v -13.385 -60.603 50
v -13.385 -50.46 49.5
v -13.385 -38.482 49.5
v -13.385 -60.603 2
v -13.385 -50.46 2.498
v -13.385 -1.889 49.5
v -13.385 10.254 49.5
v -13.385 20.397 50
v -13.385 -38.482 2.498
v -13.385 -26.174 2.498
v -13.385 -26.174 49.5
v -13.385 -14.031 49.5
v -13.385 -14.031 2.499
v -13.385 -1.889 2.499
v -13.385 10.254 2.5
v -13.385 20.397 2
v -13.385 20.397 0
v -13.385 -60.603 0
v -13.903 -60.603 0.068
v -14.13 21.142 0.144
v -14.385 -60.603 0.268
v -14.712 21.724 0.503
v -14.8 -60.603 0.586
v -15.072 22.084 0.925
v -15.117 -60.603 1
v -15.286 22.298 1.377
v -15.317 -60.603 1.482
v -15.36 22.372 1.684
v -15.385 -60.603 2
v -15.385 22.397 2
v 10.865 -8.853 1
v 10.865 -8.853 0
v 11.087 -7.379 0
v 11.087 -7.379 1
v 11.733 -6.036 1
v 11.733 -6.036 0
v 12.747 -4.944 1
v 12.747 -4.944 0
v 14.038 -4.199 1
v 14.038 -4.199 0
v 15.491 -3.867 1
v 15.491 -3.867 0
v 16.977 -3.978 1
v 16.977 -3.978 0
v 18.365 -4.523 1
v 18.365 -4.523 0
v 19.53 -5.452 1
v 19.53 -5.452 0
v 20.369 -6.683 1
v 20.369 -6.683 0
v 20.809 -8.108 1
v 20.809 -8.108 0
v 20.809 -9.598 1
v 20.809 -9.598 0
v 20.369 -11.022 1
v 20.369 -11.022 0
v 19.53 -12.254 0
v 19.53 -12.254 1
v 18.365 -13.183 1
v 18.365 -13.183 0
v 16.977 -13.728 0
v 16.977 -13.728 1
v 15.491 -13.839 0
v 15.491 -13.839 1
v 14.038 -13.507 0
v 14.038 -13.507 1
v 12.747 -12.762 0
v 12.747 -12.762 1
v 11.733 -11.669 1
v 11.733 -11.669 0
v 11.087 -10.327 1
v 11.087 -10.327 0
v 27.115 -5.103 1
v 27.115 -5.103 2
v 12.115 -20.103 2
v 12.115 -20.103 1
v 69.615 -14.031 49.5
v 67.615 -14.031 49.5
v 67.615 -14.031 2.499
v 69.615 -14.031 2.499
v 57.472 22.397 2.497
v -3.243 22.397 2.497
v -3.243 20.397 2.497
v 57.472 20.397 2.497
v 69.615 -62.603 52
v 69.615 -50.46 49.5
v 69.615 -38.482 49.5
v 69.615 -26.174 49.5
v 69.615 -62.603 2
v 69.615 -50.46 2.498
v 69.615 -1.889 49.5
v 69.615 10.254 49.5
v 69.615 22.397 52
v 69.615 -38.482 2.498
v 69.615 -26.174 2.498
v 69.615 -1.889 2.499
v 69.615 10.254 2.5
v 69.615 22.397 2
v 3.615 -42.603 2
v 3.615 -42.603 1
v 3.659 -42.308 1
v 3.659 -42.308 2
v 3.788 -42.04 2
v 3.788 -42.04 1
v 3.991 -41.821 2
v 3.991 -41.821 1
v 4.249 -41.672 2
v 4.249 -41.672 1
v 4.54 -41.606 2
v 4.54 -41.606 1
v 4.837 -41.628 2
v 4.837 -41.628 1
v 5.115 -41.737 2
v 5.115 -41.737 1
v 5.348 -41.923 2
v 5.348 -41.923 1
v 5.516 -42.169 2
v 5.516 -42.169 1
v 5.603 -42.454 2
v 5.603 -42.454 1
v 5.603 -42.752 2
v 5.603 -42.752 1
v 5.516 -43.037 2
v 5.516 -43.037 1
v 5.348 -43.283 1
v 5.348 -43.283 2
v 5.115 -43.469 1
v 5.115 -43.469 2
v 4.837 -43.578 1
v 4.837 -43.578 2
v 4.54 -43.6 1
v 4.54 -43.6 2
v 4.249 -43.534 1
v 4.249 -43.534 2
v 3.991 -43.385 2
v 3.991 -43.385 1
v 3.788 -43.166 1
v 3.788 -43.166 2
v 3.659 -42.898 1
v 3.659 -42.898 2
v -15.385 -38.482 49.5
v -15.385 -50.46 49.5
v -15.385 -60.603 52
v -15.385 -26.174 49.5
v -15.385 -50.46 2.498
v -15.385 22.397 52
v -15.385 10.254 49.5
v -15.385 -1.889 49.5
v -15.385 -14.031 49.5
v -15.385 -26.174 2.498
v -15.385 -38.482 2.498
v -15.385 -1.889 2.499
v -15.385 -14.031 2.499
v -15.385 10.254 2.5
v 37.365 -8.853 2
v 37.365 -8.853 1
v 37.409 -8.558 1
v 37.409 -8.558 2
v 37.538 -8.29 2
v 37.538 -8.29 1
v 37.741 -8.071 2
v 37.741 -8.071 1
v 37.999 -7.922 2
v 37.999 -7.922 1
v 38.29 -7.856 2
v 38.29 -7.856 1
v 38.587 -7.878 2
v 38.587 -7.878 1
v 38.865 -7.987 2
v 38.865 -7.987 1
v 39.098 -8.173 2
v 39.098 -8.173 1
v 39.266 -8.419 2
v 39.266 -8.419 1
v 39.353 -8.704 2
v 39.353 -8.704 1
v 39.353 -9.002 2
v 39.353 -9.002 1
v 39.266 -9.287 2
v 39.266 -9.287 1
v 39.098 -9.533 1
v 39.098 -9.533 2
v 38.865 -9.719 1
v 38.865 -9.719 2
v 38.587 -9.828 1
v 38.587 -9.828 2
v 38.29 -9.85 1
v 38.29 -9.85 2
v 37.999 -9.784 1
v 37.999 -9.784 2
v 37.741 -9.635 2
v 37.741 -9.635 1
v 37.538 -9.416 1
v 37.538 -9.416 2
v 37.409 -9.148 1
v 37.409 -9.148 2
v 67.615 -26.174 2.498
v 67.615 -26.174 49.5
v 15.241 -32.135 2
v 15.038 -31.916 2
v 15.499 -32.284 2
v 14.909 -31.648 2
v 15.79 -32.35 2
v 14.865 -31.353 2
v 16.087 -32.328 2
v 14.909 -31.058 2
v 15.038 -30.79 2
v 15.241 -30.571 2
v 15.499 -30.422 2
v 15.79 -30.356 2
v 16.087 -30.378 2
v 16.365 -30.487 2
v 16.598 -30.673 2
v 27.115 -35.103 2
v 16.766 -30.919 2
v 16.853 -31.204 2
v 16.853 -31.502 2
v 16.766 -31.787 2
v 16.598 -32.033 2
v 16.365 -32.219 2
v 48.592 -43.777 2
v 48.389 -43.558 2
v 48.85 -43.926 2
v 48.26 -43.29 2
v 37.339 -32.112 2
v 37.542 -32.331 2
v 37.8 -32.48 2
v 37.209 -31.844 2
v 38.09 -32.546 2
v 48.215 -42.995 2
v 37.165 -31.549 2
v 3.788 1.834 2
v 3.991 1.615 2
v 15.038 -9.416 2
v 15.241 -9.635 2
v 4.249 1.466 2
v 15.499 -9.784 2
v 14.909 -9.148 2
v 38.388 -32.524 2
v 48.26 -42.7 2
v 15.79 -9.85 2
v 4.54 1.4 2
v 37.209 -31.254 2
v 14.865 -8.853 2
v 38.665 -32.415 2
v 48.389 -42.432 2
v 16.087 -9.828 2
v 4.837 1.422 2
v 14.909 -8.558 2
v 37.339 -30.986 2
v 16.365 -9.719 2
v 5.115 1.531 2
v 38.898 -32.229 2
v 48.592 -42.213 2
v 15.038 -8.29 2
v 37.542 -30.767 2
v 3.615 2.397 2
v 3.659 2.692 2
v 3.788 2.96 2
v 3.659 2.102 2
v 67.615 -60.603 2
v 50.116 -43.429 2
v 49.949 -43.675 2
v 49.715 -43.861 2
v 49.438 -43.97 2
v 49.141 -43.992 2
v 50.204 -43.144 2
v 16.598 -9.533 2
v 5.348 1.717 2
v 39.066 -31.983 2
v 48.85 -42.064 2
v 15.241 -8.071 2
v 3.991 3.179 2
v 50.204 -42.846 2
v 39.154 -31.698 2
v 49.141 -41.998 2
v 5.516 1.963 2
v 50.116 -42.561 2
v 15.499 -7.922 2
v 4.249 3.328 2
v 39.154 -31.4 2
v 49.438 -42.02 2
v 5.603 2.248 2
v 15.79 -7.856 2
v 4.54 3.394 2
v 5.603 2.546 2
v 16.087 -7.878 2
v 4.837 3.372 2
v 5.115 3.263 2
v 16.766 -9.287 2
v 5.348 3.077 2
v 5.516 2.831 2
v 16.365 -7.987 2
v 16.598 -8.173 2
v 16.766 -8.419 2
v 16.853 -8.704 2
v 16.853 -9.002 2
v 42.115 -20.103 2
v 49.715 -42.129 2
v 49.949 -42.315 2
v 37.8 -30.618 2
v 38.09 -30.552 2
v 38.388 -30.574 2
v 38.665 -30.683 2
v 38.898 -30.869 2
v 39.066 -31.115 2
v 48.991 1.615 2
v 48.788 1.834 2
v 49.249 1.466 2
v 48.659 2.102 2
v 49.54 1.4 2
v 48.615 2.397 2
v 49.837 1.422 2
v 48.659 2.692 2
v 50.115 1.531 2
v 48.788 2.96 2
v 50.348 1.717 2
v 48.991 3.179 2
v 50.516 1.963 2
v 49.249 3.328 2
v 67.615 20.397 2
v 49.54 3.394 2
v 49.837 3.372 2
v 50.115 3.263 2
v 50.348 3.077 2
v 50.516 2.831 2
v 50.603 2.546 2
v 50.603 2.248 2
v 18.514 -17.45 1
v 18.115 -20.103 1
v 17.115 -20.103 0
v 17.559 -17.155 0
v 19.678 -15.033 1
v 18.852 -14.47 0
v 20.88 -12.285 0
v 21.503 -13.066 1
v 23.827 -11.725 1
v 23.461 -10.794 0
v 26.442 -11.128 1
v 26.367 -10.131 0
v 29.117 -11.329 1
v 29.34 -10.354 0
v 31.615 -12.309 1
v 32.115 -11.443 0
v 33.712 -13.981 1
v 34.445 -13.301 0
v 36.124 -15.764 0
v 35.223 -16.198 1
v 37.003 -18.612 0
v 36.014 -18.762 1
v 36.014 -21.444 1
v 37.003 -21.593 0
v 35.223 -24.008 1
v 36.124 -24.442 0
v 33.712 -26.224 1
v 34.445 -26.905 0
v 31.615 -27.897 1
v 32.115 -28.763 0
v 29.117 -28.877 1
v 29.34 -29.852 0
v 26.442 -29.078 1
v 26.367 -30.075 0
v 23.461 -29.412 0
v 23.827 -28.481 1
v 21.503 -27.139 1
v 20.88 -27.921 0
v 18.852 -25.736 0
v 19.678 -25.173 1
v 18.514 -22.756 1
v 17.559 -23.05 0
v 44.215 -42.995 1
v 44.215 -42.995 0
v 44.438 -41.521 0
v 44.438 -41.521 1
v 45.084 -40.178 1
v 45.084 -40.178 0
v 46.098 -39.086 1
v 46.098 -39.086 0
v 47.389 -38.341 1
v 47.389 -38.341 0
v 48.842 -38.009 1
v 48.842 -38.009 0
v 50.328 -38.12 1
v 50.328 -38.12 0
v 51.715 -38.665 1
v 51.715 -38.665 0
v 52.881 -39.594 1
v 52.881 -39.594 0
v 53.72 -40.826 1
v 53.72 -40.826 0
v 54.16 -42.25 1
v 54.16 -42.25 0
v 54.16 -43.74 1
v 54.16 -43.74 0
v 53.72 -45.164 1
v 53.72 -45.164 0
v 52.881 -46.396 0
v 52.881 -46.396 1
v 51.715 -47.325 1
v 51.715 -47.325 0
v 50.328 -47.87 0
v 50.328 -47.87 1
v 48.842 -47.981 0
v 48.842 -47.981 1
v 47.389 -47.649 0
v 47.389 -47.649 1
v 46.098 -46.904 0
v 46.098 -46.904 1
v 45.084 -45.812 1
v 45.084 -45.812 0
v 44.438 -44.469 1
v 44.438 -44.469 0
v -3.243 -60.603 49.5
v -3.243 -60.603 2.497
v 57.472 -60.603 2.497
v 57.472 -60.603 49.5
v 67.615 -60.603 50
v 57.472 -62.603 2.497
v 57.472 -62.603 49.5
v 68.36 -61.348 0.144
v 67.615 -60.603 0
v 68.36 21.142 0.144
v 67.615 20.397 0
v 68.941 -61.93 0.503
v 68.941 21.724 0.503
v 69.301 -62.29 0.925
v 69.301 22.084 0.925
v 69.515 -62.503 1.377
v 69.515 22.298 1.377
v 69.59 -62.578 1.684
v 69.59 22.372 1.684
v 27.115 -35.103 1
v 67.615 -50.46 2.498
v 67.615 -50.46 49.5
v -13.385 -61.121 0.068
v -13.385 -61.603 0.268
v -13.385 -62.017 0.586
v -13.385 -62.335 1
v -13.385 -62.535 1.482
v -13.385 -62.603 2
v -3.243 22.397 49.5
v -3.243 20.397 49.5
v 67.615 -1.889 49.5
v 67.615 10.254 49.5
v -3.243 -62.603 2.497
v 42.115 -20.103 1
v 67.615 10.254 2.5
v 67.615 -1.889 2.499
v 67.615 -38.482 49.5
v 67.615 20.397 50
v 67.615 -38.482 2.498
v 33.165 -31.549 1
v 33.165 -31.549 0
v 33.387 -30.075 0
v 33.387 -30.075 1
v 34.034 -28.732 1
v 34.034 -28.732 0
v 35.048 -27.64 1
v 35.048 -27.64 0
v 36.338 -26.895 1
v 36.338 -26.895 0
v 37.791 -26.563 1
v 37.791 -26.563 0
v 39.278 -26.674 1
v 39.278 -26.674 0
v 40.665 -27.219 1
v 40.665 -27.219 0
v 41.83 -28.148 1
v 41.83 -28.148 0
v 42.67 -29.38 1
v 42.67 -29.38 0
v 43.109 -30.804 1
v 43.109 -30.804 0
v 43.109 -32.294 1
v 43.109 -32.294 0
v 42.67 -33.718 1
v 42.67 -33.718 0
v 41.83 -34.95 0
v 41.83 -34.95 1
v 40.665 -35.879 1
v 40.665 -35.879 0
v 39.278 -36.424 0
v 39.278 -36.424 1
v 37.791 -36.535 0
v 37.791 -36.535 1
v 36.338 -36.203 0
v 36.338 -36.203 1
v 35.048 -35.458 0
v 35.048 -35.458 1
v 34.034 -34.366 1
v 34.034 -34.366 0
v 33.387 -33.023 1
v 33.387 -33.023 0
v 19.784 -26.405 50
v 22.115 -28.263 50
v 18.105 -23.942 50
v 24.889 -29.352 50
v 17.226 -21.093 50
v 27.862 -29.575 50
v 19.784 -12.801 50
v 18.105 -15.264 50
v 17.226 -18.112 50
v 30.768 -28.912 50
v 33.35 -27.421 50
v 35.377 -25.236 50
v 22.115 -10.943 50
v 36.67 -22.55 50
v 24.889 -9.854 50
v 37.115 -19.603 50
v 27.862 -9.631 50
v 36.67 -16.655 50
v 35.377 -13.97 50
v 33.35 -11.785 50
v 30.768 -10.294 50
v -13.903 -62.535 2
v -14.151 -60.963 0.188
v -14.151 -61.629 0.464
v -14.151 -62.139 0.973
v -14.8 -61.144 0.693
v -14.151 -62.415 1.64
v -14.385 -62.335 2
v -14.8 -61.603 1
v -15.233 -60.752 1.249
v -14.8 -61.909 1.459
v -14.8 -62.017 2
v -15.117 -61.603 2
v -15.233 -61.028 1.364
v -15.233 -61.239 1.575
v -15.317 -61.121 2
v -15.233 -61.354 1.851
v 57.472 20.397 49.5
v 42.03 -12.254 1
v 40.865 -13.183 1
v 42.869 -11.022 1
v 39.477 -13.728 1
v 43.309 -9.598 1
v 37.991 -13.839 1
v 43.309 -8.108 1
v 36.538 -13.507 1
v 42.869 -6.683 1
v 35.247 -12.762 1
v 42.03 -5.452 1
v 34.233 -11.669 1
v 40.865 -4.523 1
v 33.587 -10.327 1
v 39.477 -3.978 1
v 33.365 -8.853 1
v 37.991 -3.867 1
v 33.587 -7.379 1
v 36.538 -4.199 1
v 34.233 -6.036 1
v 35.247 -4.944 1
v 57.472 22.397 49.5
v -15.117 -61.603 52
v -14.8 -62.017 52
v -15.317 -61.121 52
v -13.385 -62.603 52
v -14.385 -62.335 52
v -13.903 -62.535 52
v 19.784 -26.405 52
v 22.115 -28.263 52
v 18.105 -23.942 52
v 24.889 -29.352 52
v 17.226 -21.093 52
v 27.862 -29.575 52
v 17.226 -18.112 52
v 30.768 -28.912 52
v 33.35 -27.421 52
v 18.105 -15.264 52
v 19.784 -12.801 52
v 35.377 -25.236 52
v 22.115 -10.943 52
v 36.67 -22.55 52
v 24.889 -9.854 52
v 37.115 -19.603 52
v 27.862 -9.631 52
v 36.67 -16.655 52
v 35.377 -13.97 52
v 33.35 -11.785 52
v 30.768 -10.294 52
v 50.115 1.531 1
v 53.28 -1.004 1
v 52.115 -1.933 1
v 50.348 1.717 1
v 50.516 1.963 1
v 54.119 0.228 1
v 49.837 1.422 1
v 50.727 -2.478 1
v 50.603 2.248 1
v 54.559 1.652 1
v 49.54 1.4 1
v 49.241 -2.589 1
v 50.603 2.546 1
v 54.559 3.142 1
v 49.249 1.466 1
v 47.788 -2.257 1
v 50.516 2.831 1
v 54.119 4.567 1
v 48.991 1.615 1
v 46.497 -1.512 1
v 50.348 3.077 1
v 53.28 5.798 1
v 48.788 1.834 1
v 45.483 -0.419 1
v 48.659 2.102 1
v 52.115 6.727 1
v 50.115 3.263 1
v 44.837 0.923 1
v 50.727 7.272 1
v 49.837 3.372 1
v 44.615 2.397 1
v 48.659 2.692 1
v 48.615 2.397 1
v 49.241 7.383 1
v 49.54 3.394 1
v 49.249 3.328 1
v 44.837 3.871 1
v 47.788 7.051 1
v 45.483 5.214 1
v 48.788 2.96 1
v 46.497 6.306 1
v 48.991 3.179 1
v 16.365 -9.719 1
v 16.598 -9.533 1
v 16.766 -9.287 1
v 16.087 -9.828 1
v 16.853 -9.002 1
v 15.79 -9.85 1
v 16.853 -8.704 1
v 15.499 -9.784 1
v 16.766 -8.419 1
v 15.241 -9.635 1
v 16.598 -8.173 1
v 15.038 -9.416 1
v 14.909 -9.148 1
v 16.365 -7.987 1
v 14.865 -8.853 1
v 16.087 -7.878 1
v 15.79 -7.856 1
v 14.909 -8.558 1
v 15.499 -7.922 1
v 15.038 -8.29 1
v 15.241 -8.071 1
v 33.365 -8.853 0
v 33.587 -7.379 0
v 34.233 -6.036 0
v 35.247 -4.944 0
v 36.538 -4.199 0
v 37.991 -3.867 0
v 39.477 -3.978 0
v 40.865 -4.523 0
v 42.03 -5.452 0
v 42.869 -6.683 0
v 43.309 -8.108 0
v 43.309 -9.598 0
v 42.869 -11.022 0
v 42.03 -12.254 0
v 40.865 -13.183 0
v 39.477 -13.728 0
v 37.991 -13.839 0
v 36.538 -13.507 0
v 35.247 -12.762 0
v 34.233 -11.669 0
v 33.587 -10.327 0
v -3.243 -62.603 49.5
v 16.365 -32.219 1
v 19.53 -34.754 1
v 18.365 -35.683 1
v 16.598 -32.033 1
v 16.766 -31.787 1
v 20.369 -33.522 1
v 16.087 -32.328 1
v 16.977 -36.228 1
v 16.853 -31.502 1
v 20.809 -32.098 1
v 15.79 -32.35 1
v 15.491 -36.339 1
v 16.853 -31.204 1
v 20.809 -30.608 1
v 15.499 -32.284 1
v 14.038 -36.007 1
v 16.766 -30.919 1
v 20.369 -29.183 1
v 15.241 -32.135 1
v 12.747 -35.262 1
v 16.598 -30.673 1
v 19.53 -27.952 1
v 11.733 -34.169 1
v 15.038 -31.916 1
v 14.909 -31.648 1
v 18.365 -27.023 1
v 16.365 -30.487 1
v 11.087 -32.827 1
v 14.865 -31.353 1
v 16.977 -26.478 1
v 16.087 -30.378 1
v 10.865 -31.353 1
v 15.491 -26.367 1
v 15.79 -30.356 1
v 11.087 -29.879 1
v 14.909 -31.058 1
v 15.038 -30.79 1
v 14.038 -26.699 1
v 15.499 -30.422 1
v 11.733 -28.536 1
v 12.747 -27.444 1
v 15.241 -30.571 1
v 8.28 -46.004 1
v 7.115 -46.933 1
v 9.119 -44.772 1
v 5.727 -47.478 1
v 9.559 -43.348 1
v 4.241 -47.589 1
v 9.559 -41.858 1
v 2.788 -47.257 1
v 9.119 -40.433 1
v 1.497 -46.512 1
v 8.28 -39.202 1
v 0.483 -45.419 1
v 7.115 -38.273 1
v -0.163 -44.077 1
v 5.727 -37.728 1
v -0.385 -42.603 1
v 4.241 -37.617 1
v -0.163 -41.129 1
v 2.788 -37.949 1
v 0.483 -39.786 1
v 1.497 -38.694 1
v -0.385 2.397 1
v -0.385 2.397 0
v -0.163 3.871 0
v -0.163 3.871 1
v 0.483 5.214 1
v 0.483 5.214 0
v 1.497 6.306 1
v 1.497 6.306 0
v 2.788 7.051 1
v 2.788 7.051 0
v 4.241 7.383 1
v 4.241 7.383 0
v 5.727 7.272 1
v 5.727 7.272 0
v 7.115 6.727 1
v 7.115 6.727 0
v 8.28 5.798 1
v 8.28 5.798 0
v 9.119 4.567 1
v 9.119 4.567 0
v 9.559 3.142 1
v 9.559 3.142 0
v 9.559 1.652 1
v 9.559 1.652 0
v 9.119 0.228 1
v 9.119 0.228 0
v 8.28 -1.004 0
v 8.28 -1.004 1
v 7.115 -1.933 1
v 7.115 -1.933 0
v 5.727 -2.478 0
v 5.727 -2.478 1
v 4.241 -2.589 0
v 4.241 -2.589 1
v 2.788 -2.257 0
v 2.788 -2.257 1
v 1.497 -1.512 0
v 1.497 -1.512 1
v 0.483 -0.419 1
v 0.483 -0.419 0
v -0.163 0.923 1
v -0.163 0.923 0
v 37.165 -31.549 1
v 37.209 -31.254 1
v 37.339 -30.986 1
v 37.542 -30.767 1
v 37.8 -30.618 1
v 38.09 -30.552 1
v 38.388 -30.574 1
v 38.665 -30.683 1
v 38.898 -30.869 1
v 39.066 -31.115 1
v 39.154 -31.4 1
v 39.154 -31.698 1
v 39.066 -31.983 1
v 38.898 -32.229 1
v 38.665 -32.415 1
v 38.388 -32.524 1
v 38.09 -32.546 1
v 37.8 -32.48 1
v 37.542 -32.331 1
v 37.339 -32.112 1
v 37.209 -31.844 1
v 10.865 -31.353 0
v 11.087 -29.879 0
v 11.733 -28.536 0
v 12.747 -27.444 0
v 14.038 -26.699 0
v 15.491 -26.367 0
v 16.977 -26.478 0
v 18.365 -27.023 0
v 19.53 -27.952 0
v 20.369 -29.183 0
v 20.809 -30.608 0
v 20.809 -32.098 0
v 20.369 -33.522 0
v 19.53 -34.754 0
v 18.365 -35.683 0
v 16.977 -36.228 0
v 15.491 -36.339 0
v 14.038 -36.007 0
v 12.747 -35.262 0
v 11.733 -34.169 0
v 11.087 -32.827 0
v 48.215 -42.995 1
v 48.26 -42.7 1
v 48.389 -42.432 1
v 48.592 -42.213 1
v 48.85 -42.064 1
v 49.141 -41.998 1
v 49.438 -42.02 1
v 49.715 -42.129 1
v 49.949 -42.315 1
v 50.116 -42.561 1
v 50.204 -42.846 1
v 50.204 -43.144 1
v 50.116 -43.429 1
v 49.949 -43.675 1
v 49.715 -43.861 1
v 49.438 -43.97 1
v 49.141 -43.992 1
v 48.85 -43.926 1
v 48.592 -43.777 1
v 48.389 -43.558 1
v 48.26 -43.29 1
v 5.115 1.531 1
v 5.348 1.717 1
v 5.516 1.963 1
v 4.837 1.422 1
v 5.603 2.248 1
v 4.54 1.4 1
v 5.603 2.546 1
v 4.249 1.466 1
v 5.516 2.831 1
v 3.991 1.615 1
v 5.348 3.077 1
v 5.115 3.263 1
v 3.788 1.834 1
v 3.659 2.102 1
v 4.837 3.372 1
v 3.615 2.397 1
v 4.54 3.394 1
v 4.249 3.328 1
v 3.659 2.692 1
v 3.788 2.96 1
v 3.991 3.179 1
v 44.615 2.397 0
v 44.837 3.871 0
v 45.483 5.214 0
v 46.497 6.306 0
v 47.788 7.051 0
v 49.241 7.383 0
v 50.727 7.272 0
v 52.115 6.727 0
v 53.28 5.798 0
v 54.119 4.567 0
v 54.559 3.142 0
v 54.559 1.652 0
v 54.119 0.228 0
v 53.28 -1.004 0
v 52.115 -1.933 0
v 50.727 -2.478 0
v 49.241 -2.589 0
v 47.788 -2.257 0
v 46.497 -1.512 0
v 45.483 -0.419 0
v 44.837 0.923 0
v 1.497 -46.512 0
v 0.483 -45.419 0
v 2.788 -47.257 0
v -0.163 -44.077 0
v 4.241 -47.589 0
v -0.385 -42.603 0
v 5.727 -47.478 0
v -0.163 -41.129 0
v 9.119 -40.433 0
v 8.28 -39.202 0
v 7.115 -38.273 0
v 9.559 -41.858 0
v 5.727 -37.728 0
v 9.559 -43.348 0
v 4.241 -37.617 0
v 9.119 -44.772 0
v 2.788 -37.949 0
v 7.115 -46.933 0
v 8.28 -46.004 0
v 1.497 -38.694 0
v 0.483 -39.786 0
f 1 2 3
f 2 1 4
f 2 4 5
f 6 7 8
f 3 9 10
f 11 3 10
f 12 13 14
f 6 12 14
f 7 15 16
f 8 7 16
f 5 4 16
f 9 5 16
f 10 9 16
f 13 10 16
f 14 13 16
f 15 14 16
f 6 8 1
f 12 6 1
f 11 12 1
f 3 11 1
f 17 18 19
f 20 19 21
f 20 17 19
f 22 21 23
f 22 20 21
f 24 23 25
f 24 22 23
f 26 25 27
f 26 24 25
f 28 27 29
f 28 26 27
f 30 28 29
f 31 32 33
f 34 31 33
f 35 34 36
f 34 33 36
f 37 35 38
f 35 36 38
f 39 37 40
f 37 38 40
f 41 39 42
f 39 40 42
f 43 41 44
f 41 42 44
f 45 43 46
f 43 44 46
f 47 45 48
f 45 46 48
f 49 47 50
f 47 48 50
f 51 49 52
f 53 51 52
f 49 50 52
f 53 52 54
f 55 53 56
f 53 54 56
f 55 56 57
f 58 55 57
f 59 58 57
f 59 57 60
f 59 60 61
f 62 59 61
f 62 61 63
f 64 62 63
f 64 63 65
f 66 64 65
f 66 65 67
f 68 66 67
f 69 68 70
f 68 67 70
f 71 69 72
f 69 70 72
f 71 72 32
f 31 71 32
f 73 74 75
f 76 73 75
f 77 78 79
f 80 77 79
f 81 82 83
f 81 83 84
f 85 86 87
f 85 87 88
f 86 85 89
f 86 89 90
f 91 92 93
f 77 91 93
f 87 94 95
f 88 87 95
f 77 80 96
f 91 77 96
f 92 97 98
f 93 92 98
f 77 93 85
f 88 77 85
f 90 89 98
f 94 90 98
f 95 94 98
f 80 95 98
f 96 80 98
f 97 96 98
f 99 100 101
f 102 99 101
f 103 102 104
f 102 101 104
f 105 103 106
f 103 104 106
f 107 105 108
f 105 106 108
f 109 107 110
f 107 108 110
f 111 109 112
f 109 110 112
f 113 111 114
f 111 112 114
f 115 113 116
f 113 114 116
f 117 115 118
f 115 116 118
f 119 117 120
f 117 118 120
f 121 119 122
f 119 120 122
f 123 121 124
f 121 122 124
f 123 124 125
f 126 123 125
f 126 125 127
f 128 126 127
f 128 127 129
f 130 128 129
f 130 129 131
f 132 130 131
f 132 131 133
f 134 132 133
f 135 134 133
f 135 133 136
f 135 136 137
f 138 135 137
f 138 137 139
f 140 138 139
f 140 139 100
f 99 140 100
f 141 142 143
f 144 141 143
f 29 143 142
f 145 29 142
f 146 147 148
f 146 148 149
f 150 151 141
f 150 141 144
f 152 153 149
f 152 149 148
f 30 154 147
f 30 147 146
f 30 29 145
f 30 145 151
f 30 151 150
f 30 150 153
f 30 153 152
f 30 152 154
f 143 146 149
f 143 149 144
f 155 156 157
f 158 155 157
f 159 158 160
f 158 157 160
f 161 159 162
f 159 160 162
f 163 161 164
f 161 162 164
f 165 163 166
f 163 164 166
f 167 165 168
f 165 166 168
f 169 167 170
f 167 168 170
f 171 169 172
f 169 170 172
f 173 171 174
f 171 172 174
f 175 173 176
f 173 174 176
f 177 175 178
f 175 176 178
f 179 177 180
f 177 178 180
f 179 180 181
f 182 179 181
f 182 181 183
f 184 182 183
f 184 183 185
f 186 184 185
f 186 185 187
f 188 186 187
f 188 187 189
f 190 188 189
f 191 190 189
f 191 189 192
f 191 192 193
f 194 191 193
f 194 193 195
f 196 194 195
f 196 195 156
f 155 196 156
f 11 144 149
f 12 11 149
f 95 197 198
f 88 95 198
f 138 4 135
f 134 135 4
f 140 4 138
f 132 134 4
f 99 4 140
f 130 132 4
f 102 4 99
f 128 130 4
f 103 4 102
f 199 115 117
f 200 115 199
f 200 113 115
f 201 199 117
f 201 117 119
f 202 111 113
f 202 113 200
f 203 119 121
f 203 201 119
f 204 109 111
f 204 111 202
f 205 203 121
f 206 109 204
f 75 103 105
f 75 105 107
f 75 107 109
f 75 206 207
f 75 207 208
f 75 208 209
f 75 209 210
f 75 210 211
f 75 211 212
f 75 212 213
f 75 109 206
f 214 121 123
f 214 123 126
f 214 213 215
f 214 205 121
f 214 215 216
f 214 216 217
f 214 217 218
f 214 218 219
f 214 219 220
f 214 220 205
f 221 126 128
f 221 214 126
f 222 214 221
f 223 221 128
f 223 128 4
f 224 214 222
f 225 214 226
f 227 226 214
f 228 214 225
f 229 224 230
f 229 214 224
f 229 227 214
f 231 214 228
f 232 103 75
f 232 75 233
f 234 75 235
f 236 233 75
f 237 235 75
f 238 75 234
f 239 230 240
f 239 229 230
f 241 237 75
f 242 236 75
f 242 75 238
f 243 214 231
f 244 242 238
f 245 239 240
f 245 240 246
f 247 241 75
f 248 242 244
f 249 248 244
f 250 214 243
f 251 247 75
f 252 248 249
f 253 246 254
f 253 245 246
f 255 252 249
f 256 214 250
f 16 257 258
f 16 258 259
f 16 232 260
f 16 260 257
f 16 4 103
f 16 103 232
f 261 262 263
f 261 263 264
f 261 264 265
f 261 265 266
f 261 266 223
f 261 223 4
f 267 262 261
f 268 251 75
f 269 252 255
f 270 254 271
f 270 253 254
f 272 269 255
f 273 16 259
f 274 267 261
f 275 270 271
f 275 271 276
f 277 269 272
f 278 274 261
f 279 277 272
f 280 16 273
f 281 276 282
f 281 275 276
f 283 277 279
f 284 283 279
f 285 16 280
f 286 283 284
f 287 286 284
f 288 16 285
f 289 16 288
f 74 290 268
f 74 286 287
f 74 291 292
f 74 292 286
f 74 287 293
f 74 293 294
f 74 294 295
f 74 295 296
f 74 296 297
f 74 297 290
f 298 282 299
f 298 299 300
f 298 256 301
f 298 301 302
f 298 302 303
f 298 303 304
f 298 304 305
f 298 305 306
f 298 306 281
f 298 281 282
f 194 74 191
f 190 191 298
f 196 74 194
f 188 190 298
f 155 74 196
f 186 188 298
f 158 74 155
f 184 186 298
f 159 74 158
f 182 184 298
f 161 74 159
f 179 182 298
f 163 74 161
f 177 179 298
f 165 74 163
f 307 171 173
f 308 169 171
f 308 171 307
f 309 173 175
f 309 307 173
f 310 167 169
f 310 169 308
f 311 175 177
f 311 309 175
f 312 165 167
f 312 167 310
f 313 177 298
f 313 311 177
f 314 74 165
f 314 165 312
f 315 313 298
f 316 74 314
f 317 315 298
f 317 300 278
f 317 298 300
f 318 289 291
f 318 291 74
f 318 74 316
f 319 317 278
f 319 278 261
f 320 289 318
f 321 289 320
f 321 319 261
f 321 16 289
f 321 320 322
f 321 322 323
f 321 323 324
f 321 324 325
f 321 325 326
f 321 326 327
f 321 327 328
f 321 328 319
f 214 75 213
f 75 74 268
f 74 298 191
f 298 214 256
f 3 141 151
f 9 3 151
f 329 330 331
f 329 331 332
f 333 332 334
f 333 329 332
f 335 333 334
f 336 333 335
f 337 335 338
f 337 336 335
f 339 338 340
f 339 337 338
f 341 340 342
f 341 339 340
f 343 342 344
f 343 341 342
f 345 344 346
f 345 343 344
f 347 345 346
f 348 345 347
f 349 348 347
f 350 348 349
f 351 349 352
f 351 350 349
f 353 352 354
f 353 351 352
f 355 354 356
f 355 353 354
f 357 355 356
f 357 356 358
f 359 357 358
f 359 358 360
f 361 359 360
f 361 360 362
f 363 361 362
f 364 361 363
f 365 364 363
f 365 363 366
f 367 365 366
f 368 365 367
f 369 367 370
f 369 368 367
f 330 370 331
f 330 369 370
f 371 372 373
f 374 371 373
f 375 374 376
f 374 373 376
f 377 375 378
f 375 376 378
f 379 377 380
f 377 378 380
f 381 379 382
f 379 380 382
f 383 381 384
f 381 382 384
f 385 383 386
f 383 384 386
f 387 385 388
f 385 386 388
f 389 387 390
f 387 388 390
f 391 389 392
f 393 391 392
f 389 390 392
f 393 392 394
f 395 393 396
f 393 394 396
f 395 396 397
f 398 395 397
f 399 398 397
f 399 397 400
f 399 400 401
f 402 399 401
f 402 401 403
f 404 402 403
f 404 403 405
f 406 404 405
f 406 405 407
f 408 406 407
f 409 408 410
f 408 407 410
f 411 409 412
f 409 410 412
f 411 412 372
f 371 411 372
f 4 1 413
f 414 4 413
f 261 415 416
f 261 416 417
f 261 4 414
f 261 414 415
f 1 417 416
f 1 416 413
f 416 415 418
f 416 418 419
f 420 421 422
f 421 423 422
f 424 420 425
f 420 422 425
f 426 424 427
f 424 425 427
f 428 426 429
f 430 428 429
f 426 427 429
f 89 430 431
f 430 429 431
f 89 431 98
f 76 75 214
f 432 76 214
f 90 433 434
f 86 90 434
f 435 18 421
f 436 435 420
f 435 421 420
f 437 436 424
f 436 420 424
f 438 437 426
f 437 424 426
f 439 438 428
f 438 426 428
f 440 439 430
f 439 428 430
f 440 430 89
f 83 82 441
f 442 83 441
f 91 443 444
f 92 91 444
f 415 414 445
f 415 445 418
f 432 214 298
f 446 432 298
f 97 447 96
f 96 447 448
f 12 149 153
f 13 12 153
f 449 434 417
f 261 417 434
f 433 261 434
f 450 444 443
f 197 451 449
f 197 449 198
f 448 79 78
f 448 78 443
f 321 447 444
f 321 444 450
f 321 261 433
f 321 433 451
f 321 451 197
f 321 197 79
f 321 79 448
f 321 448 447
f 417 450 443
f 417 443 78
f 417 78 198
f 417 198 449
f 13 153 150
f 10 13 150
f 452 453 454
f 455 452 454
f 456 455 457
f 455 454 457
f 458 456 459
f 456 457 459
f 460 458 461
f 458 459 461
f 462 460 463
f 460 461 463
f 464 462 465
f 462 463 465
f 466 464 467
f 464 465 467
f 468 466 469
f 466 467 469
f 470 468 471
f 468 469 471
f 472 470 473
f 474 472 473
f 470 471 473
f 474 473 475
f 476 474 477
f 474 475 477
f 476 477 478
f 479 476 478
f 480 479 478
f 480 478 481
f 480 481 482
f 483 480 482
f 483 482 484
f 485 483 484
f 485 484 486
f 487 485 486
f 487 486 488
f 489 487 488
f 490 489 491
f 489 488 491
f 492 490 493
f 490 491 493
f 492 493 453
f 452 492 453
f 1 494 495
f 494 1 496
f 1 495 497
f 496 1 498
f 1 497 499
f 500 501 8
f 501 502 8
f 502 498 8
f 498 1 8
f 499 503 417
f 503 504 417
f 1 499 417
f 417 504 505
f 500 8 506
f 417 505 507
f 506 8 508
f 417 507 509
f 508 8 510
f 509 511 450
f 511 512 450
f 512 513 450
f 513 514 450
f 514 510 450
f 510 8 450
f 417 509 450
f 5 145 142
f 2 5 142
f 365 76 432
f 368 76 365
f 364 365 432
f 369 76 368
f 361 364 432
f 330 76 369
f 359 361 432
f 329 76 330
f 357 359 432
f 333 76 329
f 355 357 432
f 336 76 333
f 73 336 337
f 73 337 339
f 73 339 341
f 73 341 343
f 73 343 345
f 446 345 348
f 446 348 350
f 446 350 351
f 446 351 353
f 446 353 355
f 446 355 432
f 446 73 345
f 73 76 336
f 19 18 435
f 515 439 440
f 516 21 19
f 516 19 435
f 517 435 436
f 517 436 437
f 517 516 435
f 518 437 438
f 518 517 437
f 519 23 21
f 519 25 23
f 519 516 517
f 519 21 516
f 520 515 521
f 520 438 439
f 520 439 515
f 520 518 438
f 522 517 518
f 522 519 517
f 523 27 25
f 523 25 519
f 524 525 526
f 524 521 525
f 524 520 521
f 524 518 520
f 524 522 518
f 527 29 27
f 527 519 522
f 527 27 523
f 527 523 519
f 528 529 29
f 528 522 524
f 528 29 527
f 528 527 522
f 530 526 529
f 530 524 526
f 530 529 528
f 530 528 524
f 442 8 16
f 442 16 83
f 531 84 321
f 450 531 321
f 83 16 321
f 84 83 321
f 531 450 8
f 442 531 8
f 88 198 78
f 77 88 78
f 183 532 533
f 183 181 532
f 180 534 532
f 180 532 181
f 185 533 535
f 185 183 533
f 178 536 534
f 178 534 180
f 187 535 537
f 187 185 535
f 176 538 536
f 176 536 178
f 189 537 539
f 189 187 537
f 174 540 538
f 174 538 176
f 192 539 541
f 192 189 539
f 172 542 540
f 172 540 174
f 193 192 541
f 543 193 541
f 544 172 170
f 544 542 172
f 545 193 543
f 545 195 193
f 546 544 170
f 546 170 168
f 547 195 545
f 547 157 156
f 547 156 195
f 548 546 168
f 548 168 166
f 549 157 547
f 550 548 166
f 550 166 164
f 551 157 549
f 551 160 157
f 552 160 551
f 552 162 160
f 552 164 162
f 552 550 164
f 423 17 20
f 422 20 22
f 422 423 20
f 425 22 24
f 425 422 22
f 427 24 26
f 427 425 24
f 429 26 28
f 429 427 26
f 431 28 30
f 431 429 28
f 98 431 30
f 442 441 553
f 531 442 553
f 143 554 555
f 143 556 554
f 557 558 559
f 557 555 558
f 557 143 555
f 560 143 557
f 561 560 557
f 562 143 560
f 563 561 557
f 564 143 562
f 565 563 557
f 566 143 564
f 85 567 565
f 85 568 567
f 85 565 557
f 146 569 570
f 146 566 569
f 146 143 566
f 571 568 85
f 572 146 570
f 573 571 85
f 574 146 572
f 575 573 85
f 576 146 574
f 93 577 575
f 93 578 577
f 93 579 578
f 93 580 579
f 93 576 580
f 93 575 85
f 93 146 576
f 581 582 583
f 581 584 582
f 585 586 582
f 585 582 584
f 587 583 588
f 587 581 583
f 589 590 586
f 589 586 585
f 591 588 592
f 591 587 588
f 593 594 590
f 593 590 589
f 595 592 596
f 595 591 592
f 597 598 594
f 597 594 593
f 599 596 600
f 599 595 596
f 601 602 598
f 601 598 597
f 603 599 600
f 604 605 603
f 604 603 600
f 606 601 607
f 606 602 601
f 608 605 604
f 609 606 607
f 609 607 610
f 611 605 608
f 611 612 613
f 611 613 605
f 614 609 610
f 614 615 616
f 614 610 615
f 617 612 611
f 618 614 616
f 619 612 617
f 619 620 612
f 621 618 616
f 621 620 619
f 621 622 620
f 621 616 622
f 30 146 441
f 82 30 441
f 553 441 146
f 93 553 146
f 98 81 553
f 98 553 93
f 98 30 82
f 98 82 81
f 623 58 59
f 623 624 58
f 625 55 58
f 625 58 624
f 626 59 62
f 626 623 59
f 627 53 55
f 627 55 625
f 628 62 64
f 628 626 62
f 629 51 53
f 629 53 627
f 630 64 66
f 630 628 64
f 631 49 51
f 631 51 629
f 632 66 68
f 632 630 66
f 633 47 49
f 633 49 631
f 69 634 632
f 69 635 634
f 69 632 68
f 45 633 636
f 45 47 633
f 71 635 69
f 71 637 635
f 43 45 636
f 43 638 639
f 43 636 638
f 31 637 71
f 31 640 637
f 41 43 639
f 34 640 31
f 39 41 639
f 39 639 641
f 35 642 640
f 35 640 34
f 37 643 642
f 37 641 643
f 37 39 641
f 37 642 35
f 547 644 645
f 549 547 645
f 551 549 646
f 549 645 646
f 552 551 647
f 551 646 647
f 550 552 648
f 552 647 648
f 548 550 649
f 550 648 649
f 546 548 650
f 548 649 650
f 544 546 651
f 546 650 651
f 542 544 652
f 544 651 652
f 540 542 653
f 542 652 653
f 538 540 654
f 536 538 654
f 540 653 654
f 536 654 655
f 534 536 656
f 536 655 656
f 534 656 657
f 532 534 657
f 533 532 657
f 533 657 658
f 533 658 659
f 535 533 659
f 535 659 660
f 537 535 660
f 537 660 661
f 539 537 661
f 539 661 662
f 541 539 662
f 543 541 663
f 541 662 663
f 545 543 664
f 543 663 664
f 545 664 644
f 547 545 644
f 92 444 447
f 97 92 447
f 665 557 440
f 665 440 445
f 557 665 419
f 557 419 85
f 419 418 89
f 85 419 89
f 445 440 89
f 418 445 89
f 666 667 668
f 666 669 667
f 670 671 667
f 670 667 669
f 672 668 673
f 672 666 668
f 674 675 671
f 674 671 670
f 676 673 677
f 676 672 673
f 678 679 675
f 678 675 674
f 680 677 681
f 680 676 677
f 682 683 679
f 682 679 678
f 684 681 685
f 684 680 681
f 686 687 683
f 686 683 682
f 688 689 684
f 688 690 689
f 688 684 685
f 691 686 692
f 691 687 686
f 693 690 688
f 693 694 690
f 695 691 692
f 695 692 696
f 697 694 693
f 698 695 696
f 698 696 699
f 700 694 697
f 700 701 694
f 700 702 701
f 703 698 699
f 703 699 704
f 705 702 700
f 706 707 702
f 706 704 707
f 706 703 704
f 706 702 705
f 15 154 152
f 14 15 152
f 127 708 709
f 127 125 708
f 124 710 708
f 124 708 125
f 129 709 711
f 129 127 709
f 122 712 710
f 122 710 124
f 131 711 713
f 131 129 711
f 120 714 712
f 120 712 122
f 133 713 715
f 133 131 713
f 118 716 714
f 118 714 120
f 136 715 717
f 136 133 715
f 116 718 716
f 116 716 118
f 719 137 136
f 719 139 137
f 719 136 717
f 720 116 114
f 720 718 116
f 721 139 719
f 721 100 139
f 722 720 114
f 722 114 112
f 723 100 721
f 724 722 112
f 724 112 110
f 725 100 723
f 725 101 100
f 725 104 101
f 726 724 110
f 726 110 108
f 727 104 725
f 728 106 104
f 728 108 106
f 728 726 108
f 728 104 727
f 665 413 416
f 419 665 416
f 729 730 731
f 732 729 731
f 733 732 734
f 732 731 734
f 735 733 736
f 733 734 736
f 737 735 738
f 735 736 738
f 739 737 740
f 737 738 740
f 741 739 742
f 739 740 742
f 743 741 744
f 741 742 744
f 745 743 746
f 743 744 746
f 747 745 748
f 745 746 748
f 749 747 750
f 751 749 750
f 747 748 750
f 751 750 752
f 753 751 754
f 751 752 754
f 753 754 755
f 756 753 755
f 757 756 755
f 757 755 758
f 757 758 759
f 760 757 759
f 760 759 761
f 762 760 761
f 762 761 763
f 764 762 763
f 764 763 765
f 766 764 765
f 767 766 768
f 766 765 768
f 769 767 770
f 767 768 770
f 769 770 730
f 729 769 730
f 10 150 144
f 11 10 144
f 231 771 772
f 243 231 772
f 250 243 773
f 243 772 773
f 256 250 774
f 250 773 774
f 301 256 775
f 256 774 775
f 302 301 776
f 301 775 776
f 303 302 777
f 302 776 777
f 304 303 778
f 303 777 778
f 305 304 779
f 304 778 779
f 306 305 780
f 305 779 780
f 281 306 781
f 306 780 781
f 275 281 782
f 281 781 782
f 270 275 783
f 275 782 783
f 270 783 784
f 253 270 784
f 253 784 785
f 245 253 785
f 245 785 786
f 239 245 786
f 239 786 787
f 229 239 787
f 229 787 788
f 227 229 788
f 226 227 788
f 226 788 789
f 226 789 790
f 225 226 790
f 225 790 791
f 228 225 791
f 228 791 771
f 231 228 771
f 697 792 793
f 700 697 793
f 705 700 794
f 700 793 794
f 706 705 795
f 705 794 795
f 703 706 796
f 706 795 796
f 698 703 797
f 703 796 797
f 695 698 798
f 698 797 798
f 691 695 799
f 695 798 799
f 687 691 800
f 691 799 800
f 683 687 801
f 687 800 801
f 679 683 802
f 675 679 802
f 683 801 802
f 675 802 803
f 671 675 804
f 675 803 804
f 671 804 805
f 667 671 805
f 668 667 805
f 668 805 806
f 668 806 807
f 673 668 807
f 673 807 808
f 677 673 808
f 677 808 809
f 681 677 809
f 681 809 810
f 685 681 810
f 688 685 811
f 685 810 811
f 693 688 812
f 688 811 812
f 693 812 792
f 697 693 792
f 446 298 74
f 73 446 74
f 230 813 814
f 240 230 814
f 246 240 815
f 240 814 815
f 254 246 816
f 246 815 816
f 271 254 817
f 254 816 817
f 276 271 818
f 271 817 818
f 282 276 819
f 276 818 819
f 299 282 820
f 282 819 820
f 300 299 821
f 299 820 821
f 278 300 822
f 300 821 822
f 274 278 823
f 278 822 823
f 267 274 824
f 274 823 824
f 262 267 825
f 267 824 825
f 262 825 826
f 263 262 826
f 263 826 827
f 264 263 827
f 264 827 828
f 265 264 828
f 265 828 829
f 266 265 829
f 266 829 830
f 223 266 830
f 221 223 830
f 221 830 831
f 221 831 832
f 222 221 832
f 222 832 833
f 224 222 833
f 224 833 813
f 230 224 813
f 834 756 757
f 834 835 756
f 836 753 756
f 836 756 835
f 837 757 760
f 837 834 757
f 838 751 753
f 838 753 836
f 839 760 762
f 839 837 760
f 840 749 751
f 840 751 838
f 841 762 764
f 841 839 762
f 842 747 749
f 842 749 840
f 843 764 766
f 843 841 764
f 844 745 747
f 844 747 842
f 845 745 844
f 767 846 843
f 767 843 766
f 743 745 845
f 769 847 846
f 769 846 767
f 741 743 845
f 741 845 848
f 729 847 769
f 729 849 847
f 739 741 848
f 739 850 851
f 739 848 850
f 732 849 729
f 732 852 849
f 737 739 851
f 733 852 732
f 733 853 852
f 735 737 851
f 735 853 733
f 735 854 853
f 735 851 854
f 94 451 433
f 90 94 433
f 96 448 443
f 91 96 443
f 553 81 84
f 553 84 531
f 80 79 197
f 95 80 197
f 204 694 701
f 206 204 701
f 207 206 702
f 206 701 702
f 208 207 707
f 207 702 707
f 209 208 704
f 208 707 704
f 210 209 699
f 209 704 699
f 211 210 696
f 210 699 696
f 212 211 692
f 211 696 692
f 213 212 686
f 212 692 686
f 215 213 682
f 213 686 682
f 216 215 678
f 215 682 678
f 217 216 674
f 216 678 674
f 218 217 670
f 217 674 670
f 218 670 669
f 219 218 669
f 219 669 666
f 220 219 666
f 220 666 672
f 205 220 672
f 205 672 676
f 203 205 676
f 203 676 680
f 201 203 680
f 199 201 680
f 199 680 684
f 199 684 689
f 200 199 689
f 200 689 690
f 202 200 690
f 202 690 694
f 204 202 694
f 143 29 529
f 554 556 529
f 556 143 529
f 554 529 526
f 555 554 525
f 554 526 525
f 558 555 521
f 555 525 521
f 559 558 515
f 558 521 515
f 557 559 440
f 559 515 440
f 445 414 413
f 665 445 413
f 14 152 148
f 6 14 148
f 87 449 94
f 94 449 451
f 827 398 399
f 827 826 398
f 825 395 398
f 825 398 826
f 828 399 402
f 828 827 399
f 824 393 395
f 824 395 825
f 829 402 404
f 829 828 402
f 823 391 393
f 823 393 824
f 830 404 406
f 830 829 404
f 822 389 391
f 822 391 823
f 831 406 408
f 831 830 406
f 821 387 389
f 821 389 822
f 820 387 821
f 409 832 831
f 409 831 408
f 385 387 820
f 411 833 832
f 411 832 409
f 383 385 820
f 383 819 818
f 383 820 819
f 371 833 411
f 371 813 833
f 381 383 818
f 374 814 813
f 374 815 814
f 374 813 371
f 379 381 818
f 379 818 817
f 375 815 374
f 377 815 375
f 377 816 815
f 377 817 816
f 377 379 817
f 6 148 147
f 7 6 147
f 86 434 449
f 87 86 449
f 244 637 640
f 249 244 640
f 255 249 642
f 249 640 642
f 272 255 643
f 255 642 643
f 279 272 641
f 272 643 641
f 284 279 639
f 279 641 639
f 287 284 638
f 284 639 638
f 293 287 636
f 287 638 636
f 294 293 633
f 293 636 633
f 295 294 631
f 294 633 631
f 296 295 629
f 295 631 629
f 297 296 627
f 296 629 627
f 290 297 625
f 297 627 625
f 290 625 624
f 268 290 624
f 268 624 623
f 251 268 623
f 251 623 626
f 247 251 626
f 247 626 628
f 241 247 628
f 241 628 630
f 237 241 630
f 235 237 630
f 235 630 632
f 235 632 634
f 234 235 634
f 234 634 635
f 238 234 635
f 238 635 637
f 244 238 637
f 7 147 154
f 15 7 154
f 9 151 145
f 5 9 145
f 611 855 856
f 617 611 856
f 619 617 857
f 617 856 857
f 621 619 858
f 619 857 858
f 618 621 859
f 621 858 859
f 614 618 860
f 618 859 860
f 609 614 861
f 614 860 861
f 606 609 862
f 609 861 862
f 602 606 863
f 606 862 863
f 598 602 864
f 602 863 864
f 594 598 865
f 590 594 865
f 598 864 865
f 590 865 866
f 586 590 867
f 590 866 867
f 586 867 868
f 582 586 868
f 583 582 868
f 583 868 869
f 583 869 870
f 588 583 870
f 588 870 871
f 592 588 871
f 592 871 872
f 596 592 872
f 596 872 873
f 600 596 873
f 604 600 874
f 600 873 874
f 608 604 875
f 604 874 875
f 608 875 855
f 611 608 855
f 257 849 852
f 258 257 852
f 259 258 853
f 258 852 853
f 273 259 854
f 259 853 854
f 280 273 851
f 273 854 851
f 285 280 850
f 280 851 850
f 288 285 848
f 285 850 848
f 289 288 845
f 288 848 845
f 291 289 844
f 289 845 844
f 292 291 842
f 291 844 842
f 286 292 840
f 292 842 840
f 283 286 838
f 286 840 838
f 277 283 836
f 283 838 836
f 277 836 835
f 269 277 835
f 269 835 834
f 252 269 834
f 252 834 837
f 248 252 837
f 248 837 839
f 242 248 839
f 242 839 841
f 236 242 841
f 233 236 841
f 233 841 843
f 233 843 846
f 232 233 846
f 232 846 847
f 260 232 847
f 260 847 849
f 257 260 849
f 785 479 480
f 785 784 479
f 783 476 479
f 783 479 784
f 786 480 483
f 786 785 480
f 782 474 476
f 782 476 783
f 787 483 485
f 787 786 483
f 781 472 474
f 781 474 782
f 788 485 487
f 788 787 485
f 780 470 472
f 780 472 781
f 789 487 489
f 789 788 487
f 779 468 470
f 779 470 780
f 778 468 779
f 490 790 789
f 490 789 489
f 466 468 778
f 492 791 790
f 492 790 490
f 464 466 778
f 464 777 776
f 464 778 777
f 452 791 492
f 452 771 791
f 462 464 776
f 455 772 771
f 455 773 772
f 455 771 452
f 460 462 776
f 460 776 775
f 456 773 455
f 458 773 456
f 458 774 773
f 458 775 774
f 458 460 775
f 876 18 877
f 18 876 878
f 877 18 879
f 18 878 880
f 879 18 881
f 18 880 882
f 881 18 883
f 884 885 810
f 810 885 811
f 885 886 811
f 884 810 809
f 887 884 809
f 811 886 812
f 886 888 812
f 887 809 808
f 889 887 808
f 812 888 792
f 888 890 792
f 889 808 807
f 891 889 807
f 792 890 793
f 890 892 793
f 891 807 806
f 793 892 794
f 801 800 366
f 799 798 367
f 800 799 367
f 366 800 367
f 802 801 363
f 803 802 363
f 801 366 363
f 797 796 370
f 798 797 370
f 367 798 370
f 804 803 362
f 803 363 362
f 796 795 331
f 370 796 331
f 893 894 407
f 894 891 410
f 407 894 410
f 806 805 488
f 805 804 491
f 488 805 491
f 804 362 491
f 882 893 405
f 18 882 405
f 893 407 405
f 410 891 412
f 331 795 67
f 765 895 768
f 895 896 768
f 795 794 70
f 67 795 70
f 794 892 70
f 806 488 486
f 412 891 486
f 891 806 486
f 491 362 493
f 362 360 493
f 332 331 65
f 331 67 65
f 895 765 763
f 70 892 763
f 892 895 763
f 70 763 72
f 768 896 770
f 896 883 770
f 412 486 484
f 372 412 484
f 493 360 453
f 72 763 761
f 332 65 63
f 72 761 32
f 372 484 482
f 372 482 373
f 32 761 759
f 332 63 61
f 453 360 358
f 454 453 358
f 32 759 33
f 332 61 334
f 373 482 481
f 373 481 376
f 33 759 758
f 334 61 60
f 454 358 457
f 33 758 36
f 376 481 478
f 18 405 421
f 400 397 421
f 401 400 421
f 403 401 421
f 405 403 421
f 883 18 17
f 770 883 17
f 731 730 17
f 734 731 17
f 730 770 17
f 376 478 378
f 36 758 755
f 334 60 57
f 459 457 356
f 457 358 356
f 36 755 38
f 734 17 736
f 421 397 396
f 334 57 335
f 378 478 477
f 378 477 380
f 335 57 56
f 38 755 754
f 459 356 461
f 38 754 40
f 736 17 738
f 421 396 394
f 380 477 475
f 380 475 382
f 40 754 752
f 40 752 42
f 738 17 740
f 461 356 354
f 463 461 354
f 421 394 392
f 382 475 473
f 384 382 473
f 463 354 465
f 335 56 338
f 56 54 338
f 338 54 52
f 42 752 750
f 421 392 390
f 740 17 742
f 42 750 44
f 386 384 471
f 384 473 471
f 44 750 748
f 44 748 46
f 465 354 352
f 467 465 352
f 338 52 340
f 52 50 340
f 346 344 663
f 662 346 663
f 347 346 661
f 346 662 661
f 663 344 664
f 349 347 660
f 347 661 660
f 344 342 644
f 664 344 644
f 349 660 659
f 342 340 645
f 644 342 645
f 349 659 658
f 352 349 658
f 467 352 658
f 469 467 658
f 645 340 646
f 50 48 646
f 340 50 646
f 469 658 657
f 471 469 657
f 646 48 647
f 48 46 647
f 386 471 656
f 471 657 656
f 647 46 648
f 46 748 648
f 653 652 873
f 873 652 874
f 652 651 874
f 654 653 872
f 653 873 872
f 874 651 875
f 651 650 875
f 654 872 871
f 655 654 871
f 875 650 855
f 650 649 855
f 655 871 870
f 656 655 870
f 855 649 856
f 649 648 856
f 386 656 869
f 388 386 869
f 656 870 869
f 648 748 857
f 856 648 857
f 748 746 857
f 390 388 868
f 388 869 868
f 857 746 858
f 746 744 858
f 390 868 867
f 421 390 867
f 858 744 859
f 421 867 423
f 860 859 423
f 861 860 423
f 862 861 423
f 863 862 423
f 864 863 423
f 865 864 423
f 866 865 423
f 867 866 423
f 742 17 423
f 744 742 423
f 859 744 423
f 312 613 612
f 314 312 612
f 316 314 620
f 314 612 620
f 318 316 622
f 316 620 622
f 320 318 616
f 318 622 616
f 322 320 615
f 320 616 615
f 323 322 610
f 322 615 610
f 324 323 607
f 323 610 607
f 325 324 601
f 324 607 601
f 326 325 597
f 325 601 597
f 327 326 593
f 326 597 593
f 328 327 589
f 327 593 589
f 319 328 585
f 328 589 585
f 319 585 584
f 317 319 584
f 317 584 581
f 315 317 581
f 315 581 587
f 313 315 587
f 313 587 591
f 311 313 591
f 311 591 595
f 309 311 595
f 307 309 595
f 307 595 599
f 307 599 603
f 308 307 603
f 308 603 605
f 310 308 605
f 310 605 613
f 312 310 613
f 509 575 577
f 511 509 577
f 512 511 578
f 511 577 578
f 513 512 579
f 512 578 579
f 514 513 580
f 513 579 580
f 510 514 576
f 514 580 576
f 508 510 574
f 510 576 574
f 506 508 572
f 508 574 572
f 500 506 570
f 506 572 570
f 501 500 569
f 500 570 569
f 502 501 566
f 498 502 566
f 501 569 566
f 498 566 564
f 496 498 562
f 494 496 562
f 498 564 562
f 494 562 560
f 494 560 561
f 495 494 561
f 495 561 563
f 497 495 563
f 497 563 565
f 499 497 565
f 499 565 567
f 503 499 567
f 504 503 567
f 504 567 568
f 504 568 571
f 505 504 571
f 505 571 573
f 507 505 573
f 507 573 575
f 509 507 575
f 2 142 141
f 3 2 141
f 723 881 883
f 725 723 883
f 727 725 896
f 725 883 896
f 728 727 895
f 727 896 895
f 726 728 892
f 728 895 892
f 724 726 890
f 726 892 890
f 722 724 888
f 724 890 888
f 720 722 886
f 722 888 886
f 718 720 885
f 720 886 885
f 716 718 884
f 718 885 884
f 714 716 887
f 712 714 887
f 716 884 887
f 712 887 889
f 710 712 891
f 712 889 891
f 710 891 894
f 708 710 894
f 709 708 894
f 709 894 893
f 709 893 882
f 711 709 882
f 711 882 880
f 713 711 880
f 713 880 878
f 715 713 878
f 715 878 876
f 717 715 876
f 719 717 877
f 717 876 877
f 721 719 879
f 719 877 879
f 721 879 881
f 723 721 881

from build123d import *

# Parameters (mm, degrees)
SKETCH_1_W               = 85
SKETCH_1_H               = 85
EXTRUDE_1_DEPTH          = 2
SKETCH_2_R               = 9
CUT_EXTRUDE_1_DEPTH      = 2
SKETCH_4_R               = 5
CUT_EXTRUDE_4_DEPTH      = 1
SKETCH_5_R               = 1
CUT_EXTRUDE_5_DEPTH      = 94.644624303
SKETCH_1_3_W             = 85
SKETCH_1_3_H             = 85
SKETCH_1_3_W_2           = 81
SKETCH_1_3_H_2           = 81
EXTRUDE_2_DEPTH          = 50
SKETCH_7_W               = 85
SKETCH_7_H               = 85
EXTRUDE_3_DEPTH          = 2
CUT_EXTRUDE_6_DEPTH      = 118.678046964
CUT_EXTRUDE_6_DEPTH_BACK = 118.678046964
CUT_EXTRUDE_7_DEPTH      = 122.55325139
CUT_EXTRUDE_7_DEPTH_BACK = 122.55325139
SKETCH_10_W              = 60.714285714
SKETCH_10_H              = 47.002651285
CHAMFER_4_SIZE           = 1
FILLET_1_R               = 2
FILLET_2_R               = 2
SKETCH_11_R              = 10
CUT_EXTRUDE_8_DEPTH      = 10
CUT_EXTRUDE_9_DEPTH      = 1


with BuildPart() as part:
    # 草图1 → 凸台-拉伸1 (new body)
    with BuildSketch(Plane.XY):
        with Locations((27.114602804, -20.102897196)):
            Rectangle(SKETCH_1_W, SKETCH_1_H)
    extrude(amount=EXTRUDE_1_DEPTH)

    # 草图2 → 切除-拉伸1 (cut)
    with BuildSketch(Plane(origin=(0, 0, 0), x_dir=(-1, 0, 0), z_dir=(0, 0, -1))):
        with Locations((-27.114602804, -20.102897196)):
            Circle(SKETCH_2_R)
    extrude(amount=-CUT_EXTRUDE_1_DEPTH, mode=Mode.SUBTRACT)

    # 草图4 → 切除-拉伸4 (cut)
    with BuildSketch(Plane(origin=(0, 0, 0), x_dir=(-1, 0, 0), z_dir=(0, 0, -1))):
        with Locations((-49.215493554, -42.995049302)):
            Circle(SKETCH_4_R)
        with Locations((-38.165048179, -31.548973249)):
            Circle(SKETCH_4_R)
        with Locations((-49.614602804, 2.397102804)):
            Circle(SKETCH_4_R)
        with Locations((-38.364602804, -8.852897196)):
            Circle(SKETCH_4_R)
        with Locations((-4.614602804, -42.602897196)):
            Circle(SKETCH_4_R)
        with Locations((-15.864602804, -31.352897196)):
            Circle(SKETCH_4_R)
        with Locations((-4.614602804, 2.397102804)):
            Circle(SKETCH_4_R)
        with Locations((-15.864602804, -8.852897196)):
            Circle(SKETCH_4_R)
    extrude(amount=-CUT_EXTRUDE_4_DEPTH, mode=Mode.SUBTRACT)

    # 草图5 → 切除-拉伸5 (cut, through all)
    with BuildSketch(Plane(origin=(0, 0, 0), x_dir=(-1, 0, 0), z_dir=(0, 0, -1))):
        with Locations((-4.614602804, -42.602897196)):
            Circle(SKETCH_5_R)
        with Locations((-15.864602804, -31.352897196)):
            Circle(SKETCH_5_R)
        with Locations((-15.864602804, -8.852897196)):
            Circle(SKETCH_5_R)
        with Locations((-4.614602804, 2.397102804)):
            Circle(SKETCH_5_R)
        with Locations((-38.364602804, -8.852897196)):
            Circle(SKETCH_5_R)
        with Locations((-49.614602804, 2.397102804)):
            Circle(SKETCH_5_R)
        with Locations((-49.215493554, -42.995049302)):
            Circle(SKETCH_5_R)
        with Locations((-38.165048179, -31.548973249)):
            Circle(SKETCH_5_R)
    extrude(amount=-CUT_EXTRUDE_5_DEPTH, mode=Mode.SUBTRACT)

    # 草图1<3> → 凸台-拉伸2 (add)
    with BuildSketch(Plane.XY):
        with Locations((27.114602804, -20.102897196)):
            Rectangle(SKETCH_1_3_W, SKETCH_1_3_H)
        with Locations((27.114602804, -20.102897196)):
            Rectangle(SKETCH_1_3_W_2, SKETCH_1_3_H_2, mode=Mode.SUBTRACT)
    extrude(amount=EXTRUDE_2_DEPTH)

    # 草图7 → 凸台-拉伸3 (add)
    with BuildSketch(Plane.XY.offset(50)):
        with Locations((27.114602804, -20.102897196)):
            Rectangle(SKETCH_7_W, SKETCH_7_H)
    extrude(amount=EXTRUDE_3_DEPTH)

    # 草图9 → 切除-拉伸6 (cut, two sides: drawn at the far end of the back side and taken through both)
    with BuildSketch(Plane(origin=(69.614602804, 0, 0), x_dir=(0, 0, -1), z_dir=(1, 0, 0)).offset(-CUT_EXTRUDE_6_DEPTH_BACK)):
        Polygon((-2.49772747, -50.460040053), (-49.5, -50.460040053), (-49.5, -38.482138921), (-2.49810108, -38.482138921), align=None)
        Polygon((-2.49848498, -26.174325768), (-49.5, -26.174325768), (-49.5, -14.031468625), (-2.498863735, -14.031468625), align=None)
        Polygon((-2.49924249, -1.888611482), (-49.5, -1.888611482), (-49.5, 10.254245661), (-2.499621245, 10.254245661), align=None)
    extrude(amount=CUT_EXTRUDE_6_DEPTH + CUT_EXTRUDE_6_DEPTH_BACK, mode=Mode.SUBTRACT)

    # 草图10 → 切除-拉伸7 (cut, two sides: drawn at the far end of the back side and taken through both)
    with BuildSketch(Plane.XZ.offset(62.602897196).offset(-CUT_EXTRUDE_7_DEPTH_BACK)):
        with Locations((27.114602804, 25.998674358)):
            Rectangle(SKETCH_10_W, SKETCH_10_H)
    extrude(amount=CUT_EXTRUDE_7_DEPTH + CUT_EXTRUDE_7_DEPTH_BACK, mode=Mode.SUBTRACT)

    # 倒角4
    chamfer_4_edges = [part.edges().sort_by_distance(p)[0] for p in [
        (36.114602804, -20.102897196, 0),
    ]]
    chamfer(chamfer_4_edges, length=CHAMFER_4_SIZE)

    # 圆角1
    fillet_1_edges = [part.edges().sort_by_distance(p)[0] for p in [
        (27.114602804, 22.397102804, 0),
        (69.614602804, -20.102897196, 0),
        (27.114602804, -62.602897196, 0),
        (-15.385397196, -20.102897196, 0),
    ]]
    fillet(fillet_1_edges, radius=FILLET_1_R)

    # 圆角2
    # the kernel refuses this fillet: 2 mm, written as the material it takes off along each edge
    with BuildSketch(Plane(origin=(-13.385397196, -60.602897196, 2), x_dir=(0, -1, 0), z_dir=(-1, 0, 0))) as fillet_2_piece_1_section:
        Polygon((0, 0), (FILLET_2_R, 0), (FILLET_2_R, -FILLET_2_R), (0, -FILLET_2_R), align=None)
    fillet_2_piece_1 = extrude(amount=FILLET_2_R, mode=Mode.PRIVATE)
    fillet_2_piece_1 = fillet_2_piece_1 - Plane(origin=(-13.385397196, -60.602897196, 2), x_dir=(0, 0.7071067811865475, 0.7071067811865475), z_dir=(-1, 0, 0)) * Sphere(FILLET_2_R, mode=Mode.PRIVATE)
    add(fillet_2_piece_1, mode=Mode.SUBTRACT)
    with BuildSketch(Plane(origin=(-15.385397196, -62.602897196, 2), x_dir=(0, 1, 0), z_dir=(0, 0, 1))) as fillet_2_piece_2:
        with BuildLine():
            CenterArc((FILLET_2_R, -FILLET_2_R), FILLET_2_R, 90, 90)
            Line((0, -FILLET_2_R), (0, 0))
            Line((0, 0), (FILLET_2_R, 0))
        make_face()
    extrude(amount=55, mode=Mode.SUBTRACT)

    # 草图11 → 切除-拉伸8 (cut)
    with BuildSketch(Plane.XY.offset(52)):
        with Locations((27.114602804, -19.602897196)):
            Circle(SKETCH_11_R)
    extrude(amount=-CUT_EXTRUDE_8_DEPTH, mode=Mode.SUBTRACT)

    # 草图12 → 切除-拉伸9 (cut)
    with BuildSketch(Plane.XY.offset(2)):
        Polygon((12.114602804, -20.102897196), (27.114602804, -35.102897196), (42.114602804, -20.102897196), (27.114602804, -5.102897196), align=None)
    extrude(amount=-CUT_EXTRUDE_9_DEPTH, mode=Mode.SUBTRACT)


solid = part.part
